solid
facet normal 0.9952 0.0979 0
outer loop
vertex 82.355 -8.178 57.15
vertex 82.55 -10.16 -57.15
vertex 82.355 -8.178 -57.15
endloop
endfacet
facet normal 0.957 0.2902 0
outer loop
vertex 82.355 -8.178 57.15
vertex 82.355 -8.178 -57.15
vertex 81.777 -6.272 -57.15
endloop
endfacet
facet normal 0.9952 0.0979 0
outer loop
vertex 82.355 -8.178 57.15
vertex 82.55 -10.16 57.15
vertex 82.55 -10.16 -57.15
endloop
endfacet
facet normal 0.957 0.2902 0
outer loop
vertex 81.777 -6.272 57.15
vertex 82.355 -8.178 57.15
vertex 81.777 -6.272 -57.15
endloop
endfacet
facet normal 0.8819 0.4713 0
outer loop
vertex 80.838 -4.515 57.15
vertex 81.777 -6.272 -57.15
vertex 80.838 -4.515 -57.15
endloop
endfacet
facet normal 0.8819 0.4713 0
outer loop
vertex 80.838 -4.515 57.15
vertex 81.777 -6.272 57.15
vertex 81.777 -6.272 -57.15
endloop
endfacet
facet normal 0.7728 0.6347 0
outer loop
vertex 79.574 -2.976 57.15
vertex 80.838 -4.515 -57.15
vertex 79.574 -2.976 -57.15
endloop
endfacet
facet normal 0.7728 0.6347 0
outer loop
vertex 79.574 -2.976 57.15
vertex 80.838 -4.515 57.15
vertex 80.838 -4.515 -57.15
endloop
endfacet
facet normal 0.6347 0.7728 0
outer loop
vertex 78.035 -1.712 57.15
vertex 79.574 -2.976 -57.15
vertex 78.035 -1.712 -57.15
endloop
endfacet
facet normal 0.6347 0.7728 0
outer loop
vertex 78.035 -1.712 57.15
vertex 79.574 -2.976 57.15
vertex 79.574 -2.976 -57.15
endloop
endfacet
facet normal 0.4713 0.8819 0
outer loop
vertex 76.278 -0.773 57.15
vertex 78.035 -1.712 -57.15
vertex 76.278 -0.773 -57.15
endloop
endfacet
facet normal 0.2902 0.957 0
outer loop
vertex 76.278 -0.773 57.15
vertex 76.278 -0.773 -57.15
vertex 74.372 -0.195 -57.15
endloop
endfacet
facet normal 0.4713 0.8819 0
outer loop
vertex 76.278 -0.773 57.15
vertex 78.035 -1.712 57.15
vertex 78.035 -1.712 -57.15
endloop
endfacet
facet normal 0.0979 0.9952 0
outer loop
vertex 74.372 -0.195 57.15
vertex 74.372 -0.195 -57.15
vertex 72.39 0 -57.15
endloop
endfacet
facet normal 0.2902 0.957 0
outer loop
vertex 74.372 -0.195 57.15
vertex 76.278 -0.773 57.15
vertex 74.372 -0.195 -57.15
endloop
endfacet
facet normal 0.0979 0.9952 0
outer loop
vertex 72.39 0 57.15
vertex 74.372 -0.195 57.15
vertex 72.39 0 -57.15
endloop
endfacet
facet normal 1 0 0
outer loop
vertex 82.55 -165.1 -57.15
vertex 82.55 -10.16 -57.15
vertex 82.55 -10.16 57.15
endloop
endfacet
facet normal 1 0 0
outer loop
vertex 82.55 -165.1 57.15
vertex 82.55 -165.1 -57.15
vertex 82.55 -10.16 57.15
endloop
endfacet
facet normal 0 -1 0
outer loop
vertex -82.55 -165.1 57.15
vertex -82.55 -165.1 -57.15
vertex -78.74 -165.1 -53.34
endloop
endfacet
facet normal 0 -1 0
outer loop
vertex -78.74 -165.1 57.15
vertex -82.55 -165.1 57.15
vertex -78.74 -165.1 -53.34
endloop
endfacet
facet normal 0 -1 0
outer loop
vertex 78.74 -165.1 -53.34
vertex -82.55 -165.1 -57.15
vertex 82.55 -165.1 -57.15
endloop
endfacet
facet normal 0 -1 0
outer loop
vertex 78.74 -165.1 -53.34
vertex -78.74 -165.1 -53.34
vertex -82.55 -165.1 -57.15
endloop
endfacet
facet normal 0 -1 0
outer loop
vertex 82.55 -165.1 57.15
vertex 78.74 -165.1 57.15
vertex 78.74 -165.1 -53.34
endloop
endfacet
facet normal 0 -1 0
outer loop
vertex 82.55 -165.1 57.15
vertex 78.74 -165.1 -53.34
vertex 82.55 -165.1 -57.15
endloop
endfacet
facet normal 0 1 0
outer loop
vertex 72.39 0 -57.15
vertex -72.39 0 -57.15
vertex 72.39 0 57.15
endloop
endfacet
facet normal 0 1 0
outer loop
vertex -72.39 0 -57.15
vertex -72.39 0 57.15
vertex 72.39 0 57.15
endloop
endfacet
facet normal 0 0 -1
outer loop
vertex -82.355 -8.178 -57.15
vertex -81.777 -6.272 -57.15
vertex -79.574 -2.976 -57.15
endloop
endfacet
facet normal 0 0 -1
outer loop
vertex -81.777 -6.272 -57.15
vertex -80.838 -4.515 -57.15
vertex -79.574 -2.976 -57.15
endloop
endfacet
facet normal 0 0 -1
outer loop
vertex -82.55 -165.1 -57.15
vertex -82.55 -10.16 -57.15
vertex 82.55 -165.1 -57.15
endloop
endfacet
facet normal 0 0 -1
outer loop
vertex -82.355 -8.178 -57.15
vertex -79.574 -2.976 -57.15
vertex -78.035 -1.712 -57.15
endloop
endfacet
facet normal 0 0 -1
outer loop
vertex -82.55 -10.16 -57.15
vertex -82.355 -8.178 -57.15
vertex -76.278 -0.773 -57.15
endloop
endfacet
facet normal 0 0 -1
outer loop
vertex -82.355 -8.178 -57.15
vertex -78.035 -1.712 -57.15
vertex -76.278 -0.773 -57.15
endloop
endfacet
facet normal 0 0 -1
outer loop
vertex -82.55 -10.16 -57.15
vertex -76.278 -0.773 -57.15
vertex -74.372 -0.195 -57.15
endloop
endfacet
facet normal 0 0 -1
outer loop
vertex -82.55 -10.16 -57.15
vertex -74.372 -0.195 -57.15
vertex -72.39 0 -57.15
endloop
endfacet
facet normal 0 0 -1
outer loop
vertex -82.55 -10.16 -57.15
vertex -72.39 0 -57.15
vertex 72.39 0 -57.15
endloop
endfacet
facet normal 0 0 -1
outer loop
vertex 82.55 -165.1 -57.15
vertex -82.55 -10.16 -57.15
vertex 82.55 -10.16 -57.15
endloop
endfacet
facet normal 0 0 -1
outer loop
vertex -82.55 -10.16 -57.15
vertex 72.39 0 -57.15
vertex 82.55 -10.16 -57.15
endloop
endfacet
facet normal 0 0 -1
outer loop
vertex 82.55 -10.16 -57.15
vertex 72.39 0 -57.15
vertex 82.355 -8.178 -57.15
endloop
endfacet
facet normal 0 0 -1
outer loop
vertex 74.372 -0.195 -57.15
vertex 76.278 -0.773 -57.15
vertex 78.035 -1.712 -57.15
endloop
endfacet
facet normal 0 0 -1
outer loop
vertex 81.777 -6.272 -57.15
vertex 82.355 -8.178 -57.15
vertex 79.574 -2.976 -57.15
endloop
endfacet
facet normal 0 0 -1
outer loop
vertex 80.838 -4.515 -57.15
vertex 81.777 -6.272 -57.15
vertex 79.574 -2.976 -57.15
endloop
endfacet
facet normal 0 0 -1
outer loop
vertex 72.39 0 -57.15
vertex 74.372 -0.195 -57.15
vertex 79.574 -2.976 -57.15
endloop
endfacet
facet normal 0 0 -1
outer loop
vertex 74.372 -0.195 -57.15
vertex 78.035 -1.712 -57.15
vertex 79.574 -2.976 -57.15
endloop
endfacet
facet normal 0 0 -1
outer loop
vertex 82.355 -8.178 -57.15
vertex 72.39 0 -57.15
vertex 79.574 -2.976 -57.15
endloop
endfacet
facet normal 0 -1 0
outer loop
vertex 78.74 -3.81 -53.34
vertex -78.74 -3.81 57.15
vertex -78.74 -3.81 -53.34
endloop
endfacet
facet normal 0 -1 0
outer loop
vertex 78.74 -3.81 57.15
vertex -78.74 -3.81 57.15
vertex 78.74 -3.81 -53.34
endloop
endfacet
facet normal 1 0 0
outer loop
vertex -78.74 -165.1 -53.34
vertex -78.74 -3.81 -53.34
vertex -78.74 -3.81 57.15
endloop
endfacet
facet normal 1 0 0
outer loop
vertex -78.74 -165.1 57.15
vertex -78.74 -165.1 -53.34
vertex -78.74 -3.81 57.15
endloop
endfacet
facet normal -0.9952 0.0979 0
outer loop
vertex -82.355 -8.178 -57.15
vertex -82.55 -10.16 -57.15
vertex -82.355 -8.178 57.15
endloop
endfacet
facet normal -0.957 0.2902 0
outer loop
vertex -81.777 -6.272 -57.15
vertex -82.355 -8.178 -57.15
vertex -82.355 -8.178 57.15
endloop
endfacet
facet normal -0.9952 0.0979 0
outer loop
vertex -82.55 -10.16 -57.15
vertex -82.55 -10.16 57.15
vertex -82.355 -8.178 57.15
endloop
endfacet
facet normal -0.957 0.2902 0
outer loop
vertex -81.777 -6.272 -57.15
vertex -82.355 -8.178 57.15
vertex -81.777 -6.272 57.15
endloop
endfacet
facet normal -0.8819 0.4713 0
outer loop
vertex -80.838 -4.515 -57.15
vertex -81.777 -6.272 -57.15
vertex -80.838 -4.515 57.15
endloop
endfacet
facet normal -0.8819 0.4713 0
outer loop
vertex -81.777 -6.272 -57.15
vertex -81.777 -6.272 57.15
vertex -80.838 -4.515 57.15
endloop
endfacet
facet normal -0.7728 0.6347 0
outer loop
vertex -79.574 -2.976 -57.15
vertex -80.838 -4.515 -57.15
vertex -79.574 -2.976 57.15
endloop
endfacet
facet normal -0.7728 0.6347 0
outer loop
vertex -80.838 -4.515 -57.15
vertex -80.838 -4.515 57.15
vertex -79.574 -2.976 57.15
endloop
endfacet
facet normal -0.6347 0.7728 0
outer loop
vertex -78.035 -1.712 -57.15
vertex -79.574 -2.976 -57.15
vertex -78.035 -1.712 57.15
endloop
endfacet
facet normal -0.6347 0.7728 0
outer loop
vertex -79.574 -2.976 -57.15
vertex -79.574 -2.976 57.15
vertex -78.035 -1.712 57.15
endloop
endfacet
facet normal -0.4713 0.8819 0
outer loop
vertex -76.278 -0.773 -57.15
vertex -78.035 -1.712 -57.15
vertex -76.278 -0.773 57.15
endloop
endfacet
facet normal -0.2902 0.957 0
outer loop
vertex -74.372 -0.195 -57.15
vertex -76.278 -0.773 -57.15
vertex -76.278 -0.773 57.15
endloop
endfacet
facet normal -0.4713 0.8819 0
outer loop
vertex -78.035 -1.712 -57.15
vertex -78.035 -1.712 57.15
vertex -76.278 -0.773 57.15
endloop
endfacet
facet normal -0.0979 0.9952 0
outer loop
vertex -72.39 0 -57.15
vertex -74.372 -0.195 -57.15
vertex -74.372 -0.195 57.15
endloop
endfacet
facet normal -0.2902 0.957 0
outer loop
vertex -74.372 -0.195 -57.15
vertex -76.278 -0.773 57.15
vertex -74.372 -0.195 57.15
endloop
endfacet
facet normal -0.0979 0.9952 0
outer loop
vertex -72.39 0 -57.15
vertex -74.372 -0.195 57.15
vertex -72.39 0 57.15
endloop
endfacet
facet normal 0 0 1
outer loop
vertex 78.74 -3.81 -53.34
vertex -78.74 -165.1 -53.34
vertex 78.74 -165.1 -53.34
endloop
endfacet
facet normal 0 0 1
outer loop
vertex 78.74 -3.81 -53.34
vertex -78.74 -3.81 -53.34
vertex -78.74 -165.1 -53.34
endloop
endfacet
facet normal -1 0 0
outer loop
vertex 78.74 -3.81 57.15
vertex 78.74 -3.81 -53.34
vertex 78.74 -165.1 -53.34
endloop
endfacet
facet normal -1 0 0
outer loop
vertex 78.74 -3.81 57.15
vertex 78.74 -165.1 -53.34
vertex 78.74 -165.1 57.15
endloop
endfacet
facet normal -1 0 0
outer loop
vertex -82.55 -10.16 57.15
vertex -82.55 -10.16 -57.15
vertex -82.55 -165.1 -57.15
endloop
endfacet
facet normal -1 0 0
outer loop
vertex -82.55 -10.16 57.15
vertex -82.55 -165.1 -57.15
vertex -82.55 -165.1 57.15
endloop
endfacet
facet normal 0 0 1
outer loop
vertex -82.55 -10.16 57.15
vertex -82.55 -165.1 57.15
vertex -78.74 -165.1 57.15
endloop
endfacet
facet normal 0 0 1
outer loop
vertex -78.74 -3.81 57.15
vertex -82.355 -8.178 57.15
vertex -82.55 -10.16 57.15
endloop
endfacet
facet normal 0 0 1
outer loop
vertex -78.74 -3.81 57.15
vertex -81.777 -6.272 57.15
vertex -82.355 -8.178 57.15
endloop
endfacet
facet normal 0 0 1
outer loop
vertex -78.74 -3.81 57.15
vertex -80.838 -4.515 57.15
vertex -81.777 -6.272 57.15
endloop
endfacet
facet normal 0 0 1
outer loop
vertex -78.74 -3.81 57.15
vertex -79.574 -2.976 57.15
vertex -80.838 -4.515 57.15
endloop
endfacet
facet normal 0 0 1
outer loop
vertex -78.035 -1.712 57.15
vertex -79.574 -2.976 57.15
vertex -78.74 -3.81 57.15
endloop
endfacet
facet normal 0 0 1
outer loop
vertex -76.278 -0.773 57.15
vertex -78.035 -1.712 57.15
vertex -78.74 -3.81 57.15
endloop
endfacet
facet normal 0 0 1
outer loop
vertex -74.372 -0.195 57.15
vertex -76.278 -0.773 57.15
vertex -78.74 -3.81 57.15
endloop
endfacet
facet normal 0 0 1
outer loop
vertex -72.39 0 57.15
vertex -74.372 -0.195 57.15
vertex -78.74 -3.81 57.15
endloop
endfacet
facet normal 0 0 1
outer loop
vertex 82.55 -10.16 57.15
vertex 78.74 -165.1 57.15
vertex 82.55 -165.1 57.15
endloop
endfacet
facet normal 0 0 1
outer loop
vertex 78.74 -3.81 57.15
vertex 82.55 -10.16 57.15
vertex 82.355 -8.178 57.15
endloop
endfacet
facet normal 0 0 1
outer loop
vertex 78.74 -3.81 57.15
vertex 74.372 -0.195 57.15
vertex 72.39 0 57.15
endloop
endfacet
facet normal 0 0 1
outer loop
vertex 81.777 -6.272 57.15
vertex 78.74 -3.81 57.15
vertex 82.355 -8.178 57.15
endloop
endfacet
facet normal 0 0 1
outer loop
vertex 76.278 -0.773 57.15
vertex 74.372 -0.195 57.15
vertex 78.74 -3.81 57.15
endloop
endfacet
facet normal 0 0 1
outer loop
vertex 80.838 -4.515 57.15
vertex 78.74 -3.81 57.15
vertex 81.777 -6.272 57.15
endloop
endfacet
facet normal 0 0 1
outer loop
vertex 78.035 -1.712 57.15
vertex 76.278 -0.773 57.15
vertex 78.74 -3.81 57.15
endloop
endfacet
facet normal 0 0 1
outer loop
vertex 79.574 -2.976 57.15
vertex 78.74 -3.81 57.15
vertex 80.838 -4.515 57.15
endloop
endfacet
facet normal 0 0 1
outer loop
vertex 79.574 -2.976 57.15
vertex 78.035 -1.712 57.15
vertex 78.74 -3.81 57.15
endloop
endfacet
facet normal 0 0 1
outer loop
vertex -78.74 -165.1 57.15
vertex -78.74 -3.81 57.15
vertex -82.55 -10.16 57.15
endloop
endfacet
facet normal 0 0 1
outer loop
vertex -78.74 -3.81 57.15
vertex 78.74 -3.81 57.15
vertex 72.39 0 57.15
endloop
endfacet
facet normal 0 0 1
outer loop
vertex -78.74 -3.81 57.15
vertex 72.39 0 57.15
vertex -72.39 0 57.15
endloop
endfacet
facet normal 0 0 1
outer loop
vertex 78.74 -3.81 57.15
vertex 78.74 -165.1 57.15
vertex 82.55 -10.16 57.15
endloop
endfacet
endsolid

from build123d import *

# Parameters (mm, degrees)
F0_W     = 165.1
F0_H     = 114.3
F1_DEPTH = 165.1
F2_T     = -3.81
F3_R     = 10.16


with BuildPart() as f1:
    # F0 (on Front) → F1 (new body)
    with BuildSketch(Plane.XZ):
        Rectangle(F0_W, F0_H)
    extrude(amount=F1_DEPTH)

    # F2
    f2_openings = [f1.faces().sort_by_distance(p)[0] for p in [
        (0, -165.1, 0),
        (0, -82.55, 57.15),
    ]]
    offset(amount=F2_T, openings=f2_openings)

    # F3
    f3_edges = [f1.edges().sort_by_distance(p)[0] for p in [
        (82.55, 0, 0),
        (-82.55, 0, 0),
    ]]
    fillet(f3_edges, radius=F3_R)


solid = f1.part
